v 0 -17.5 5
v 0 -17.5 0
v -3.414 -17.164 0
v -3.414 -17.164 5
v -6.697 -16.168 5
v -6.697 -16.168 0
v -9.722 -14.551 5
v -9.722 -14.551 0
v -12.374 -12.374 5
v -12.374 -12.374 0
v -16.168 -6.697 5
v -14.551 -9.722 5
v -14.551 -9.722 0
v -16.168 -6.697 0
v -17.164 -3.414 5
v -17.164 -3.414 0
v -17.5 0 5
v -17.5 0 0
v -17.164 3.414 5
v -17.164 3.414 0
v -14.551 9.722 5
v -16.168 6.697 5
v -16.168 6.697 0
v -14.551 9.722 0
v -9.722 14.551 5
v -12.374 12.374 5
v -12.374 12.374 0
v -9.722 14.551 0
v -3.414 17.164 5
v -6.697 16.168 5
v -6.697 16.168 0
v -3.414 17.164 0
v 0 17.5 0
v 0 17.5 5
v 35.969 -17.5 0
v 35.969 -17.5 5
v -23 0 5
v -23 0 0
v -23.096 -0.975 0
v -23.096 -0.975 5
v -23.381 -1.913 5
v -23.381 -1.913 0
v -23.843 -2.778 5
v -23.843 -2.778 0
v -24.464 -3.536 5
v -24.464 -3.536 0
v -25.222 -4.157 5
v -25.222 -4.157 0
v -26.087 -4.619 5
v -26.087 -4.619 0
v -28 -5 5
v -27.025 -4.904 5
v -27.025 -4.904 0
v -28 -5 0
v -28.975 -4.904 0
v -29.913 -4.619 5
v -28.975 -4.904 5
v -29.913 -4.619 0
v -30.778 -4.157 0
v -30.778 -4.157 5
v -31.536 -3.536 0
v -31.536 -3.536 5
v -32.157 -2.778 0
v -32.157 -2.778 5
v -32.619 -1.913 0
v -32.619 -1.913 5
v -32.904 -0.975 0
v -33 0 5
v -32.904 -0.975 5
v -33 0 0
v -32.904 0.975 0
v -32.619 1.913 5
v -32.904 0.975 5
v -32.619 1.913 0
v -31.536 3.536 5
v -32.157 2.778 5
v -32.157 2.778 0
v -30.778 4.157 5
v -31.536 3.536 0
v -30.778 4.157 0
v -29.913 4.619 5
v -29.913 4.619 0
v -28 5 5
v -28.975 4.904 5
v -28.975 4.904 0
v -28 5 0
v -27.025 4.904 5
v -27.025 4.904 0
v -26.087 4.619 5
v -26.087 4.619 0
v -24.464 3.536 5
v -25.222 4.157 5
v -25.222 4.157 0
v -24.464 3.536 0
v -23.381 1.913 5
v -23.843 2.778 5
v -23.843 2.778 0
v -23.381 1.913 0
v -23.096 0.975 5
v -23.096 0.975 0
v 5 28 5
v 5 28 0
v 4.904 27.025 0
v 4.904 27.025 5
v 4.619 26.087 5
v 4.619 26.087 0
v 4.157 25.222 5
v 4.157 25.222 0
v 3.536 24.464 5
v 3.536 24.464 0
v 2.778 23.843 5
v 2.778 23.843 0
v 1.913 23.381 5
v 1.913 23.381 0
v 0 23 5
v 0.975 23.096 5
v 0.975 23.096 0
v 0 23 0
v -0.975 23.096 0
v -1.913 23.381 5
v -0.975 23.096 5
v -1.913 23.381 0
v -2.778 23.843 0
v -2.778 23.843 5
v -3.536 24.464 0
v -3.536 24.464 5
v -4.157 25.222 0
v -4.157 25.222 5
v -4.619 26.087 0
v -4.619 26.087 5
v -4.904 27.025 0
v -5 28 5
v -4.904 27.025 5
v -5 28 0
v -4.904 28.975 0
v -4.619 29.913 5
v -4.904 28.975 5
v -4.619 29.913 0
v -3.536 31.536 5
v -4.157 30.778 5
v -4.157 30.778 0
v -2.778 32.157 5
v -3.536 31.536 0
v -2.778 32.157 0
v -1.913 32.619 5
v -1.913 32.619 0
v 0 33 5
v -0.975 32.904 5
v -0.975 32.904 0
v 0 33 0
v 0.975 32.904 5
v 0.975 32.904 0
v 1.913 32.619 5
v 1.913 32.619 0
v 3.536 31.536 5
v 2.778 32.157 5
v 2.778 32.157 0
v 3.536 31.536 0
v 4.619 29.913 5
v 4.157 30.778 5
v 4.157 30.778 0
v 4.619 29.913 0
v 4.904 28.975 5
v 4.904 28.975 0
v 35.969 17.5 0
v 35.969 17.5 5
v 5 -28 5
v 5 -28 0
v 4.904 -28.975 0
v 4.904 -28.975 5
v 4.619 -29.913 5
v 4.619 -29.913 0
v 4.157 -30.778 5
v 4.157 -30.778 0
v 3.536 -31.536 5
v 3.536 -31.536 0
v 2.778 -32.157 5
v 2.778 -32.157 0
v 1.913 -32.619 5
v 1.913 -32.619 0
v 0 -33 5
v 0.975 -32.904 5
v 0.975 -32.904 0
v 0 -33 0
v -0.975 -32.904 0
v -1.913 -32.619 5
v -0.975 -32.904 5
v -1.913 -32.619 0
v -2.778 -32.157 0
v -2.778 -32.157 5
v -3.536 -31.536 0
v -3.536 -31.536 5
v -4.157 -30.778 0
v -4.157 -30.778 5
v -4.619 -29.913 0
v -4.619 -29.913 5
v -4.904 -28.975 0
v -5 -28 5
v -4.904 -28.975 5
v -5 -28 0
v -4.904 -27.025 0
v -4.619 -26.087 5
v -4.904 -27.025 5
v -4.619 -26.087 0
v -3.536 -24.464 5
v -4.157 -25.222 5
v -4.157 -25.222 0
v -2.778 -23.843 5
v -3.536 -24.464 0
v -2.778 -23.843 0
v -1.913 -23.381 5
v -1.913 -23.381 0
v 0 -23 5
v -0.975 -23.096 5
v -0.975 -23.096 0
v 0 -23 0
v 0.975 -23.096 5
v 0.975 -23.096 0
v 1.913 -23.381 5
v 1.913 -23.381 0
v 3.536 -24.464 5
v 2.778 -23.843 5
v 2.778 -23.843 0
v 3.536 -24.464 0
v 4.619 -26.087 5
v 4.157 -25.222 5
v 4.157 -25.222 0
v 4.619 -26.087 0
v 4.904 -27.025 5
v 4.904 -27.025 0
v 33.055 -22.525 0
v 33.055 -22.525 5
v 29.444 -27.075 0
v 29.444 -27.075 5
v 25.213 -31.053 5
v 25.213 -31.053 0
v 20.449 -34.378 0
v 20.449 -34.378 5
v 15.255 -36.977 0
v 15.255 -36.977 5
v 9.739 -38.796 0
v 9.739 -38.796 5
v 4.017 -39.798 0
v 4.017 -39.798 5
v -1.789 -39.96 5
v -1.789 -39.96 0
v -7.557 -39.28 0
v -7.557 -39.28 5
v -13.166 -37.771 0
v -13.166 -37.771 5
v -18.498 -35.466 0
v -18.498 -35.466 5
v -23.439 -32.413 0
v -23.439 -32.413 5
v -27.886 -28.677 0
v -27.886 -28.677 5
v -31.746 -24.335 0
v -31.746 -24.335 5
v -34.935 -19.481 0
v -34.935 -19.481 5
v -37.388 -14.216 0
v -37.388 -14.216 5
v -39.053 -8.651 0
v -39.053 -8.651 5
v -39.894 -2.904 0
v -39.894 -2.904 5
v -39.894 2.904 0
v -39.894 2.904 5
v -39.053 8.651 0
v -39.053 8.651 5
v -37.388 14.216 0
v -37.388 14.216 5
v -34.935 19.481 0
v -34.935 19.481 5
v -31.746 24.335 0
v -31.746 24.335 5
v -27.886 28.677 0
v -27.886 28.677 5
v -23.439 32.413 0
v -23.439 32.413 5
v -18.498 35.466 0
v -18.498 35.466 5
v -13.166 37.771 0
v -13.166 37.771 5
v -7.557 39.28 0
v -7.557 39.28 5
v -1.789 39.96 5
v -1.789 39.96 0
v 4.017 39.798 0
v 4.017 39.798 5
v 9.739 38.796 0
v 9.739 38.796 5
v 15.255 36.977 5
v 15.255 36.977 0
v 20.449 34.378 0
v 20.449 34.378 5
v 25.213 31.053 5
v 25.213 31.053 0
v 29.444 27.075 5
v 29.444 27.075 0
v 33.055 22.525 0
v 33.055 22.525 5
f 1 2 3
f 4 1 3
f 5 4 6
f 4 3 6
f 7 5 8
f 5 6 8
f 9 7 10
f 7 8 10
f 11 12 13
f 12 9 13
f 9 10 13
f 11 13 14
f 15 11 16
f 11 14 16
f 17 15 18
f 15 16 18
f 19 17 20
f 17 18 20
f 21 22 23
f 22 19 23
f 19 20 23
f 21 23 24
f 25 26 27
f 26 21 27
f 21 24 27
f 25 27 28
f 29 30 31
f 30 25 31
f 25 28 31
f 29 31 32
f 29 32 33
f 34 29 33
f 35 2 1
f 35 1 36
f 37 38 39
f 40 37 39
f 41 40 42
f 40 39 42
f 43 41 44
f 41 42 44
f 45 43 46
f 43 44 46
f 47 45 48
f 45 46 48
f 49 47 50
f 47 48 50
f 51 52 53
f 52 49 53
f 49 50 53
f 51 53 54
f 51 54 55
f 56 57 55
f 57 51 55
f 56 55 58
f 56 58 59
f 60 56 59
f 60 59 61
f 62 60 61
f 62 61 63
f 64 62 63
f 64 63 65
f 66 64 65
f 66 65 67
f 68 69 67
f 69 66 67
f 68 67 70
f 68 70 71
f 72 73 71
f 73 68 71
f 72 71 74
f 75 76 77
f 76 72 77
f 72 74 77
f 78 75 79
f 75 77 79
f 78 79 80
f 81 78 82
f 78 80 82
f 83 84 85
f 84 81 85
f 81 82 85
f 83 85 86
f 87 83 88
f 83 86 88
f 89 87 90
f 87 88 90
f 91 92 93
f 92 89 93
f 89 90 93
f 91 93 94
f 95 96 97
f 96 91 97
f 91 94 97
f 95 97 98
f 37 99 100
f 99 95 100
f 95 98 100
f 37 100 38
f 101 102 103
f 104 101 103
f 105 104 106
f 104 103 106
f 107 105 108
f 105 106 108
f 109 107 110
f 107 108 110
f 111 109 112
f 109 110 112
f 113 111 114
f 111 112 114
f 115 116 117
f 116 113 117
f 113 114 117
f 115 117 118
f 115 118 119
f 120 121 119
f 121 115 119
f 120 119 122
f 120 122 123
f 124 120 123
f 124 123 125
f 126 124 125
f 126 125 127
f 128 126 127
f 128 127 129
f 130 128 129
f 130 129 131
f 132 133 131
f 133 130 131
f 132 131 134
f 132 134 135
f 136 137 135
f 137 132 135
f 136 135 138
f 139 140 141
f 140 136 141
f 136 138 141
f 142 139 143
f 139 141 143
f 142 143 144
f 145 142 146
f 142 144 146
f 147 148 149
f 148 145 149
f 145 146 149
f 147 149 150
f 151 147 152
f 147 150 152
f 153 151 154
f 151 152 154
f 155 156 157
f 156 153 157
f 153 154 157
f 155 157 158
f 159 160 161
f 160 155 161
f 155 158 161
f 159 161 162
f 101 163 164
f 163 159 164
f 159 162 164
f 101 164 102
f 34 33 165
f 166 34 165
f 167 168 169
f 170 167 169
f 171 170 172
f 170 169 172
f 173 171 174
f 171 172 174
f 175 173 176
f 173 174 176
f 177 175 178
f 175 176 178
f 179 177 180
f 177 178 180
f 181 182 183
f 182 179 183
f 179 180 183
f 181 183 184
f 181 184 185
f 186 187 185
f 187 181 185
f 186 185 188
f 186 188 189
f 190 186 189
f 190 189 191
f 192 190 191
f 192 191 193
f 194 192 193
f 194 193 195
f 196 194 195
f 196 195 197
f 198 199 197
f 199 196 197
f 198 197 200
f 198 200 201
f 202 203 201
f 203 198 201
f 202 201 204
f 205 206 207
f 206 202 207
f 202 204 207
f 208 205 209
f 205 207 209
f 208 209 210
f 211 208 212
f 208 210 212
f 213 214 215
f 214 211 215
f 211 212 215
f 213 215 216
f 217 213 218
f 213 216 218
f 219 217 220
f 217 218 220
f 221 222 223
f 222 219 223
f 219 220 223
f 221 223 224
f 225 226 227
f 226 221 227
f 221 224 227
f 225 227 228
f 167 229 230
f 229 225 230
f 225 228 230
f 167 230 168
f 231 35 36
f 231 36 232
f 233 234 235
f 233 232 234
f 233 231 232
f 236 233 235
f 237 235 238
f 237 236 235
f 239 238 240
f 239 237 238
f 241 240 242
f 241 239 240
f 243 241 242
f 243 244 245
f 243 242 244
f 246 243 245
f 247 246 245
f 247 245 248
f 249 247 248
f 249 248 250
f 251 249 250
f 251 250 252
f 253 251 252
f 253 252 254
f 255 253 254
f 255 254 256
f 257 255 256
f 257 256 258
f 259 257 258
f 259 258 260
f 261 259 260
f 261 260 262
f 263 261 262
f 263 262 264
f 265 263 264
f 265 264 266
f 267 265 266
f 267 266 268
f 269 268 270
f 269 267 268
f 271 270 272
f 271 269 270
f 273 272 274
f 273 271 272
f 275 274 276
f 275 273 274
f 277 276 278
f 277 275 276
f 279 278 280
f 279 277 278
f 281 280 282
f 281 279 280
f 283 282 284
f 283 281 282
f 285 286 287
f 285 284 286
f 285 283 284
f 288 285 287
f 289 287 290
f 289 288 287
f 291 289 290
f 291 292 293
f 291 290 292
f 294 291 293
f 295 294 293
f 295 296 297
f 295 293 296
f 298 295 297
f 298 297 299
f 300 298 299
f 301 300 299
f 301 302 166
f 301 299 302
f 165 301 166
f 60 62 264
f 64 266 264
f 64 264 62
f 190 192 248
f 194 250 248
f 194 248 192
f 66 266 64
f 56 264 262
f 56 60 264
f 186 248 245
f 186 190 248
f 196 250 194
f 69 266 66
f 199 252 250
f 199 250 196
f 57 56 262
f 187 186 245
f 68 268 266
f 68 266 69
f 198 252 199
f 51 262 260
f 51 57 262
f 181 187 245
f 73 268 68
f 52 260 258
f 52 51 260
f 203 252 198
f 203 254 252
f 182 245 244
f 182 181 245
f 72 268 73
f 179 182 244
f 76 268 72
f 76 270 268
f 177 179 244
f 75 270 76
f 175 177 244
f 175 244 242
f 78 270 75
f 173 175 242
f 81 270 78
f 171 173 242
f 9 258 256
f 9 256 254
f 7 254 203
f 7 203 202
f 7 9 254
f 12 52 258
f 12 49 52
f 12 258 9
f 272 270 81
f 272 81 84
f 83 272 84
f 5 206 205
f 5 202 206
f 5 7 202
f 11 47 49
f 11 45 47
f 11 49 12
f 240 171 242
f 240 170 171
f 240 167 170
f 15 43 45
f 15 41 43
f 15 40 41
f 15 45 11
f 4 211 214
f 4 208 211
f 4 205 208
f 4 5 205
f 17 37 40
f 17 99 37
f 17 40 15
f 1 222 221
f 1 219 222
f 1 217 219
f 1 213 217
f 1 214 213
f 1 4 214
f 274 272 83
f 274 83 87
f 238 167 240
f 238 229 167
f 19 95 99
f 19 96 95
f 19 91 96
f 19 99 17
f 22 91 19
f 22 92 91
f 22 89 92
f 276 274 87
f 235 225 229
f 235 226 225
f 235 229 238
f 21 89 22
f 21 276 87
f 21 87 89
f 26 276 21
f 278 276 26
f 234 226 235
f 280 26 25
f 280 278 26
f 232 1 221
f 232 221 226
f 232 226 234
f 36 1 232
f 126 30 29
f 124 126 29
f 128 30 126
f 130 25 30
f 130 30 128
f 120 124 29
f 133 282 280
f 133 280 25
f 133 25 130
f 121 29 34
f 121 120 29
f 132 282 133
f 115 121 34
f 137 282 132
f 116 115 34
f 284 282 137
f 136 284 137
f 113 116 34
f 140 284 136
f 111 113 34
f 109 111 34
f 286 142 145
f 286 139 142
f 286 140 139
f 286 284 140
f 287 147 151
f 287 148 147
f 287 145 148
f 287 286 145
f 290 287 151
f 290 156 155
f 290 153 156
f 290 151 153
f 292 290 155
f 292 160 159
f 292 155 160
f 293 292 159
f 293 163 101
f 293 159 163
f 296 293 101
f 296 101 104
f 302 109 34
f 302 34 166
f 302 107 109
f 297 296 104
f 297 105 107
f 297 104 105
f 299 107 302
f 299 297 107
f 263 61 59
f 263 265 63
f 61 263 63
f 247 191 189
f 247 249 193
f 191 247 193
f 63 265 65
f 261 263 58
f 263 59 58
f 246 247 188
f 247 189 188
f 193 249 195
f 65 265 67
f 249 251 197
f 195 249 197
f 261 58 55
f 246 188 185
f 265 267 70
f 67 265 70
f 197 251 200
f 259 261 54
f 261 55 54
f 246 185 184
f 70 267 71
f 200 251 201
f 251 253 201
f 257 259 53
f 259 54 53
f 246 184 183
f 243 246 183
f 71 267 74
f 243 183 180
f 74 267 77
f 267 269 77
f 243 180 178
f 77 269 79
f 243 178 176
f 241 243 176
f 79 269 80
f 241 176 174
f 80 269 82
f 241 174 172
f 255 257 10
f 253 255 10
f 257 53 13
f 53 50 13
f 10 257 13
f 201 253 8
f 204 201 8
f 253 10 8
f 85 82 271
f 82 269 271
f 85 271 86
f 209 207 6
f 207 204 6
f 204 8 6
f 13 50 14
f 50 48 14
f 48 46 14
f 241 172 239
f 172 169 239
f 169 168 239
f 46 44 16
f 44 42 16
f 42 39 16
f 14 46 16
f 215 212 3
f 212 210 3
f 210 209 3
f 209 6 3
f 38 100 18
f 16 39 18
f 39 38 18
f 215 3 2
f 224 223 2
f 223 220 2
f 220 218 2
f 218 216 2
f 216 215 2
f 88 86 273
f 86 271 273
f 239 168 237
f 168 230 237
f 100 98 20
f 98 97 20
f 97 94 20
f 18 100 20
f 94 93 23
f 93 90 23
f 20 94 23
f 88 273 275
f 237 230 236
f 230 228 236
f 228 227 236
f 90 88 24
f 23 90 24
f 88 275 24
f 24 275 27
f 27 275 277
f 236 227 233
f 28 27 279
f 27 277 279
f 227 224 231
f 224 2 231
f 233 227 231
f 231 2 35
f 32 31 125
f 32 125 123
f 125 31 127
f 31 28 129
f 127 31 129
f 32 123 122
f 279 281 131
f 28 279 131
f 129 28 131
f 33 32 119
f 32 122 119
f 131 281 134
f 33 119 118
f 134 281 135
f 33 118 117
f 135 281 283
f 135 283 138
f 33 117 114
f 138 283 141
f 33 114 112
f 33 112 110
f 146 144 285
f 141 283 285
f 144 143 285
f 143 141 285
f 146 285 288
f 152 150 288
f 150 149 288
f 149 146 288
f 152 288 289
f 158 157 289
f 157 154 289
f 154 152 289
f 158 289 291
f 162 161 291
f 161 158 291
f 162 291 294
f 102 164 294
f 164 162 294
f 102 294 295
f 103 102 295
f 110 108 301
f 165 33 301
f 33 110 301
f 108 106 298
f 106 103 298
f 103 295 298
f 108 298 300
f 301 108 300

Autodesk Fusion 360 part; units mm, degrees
sketch "Sketch1" plane through (0, 0, 0) normal (0, 0, 1) x (1, 0, 0)
  circle A0 centre (0, 28) radius 5
  circle A1 centre (-28, 0) radius 5
  circle A2 centre (0, -28) radius 5
  line L0 (0, 17.5) -> (35.9687, 17.5)
  line L1 (0, -17.5) -> (35.9687, -17.5)
  arc A3 (35.9687, 17.5) -> (35.9687, -17.5) centre (0, 0) ccw
  arc A4 (0, 17.5) -> (0, -17.5) centre (0, 0) ccw
  dimension "d1" = 80
  dimension "d2" = 35
  dimension "d3" = 28
  dimension "d4" = 10
  dimension "d6" = 180
extrude "Extrude1" add sketch "Sketch1" along normal blind 5
